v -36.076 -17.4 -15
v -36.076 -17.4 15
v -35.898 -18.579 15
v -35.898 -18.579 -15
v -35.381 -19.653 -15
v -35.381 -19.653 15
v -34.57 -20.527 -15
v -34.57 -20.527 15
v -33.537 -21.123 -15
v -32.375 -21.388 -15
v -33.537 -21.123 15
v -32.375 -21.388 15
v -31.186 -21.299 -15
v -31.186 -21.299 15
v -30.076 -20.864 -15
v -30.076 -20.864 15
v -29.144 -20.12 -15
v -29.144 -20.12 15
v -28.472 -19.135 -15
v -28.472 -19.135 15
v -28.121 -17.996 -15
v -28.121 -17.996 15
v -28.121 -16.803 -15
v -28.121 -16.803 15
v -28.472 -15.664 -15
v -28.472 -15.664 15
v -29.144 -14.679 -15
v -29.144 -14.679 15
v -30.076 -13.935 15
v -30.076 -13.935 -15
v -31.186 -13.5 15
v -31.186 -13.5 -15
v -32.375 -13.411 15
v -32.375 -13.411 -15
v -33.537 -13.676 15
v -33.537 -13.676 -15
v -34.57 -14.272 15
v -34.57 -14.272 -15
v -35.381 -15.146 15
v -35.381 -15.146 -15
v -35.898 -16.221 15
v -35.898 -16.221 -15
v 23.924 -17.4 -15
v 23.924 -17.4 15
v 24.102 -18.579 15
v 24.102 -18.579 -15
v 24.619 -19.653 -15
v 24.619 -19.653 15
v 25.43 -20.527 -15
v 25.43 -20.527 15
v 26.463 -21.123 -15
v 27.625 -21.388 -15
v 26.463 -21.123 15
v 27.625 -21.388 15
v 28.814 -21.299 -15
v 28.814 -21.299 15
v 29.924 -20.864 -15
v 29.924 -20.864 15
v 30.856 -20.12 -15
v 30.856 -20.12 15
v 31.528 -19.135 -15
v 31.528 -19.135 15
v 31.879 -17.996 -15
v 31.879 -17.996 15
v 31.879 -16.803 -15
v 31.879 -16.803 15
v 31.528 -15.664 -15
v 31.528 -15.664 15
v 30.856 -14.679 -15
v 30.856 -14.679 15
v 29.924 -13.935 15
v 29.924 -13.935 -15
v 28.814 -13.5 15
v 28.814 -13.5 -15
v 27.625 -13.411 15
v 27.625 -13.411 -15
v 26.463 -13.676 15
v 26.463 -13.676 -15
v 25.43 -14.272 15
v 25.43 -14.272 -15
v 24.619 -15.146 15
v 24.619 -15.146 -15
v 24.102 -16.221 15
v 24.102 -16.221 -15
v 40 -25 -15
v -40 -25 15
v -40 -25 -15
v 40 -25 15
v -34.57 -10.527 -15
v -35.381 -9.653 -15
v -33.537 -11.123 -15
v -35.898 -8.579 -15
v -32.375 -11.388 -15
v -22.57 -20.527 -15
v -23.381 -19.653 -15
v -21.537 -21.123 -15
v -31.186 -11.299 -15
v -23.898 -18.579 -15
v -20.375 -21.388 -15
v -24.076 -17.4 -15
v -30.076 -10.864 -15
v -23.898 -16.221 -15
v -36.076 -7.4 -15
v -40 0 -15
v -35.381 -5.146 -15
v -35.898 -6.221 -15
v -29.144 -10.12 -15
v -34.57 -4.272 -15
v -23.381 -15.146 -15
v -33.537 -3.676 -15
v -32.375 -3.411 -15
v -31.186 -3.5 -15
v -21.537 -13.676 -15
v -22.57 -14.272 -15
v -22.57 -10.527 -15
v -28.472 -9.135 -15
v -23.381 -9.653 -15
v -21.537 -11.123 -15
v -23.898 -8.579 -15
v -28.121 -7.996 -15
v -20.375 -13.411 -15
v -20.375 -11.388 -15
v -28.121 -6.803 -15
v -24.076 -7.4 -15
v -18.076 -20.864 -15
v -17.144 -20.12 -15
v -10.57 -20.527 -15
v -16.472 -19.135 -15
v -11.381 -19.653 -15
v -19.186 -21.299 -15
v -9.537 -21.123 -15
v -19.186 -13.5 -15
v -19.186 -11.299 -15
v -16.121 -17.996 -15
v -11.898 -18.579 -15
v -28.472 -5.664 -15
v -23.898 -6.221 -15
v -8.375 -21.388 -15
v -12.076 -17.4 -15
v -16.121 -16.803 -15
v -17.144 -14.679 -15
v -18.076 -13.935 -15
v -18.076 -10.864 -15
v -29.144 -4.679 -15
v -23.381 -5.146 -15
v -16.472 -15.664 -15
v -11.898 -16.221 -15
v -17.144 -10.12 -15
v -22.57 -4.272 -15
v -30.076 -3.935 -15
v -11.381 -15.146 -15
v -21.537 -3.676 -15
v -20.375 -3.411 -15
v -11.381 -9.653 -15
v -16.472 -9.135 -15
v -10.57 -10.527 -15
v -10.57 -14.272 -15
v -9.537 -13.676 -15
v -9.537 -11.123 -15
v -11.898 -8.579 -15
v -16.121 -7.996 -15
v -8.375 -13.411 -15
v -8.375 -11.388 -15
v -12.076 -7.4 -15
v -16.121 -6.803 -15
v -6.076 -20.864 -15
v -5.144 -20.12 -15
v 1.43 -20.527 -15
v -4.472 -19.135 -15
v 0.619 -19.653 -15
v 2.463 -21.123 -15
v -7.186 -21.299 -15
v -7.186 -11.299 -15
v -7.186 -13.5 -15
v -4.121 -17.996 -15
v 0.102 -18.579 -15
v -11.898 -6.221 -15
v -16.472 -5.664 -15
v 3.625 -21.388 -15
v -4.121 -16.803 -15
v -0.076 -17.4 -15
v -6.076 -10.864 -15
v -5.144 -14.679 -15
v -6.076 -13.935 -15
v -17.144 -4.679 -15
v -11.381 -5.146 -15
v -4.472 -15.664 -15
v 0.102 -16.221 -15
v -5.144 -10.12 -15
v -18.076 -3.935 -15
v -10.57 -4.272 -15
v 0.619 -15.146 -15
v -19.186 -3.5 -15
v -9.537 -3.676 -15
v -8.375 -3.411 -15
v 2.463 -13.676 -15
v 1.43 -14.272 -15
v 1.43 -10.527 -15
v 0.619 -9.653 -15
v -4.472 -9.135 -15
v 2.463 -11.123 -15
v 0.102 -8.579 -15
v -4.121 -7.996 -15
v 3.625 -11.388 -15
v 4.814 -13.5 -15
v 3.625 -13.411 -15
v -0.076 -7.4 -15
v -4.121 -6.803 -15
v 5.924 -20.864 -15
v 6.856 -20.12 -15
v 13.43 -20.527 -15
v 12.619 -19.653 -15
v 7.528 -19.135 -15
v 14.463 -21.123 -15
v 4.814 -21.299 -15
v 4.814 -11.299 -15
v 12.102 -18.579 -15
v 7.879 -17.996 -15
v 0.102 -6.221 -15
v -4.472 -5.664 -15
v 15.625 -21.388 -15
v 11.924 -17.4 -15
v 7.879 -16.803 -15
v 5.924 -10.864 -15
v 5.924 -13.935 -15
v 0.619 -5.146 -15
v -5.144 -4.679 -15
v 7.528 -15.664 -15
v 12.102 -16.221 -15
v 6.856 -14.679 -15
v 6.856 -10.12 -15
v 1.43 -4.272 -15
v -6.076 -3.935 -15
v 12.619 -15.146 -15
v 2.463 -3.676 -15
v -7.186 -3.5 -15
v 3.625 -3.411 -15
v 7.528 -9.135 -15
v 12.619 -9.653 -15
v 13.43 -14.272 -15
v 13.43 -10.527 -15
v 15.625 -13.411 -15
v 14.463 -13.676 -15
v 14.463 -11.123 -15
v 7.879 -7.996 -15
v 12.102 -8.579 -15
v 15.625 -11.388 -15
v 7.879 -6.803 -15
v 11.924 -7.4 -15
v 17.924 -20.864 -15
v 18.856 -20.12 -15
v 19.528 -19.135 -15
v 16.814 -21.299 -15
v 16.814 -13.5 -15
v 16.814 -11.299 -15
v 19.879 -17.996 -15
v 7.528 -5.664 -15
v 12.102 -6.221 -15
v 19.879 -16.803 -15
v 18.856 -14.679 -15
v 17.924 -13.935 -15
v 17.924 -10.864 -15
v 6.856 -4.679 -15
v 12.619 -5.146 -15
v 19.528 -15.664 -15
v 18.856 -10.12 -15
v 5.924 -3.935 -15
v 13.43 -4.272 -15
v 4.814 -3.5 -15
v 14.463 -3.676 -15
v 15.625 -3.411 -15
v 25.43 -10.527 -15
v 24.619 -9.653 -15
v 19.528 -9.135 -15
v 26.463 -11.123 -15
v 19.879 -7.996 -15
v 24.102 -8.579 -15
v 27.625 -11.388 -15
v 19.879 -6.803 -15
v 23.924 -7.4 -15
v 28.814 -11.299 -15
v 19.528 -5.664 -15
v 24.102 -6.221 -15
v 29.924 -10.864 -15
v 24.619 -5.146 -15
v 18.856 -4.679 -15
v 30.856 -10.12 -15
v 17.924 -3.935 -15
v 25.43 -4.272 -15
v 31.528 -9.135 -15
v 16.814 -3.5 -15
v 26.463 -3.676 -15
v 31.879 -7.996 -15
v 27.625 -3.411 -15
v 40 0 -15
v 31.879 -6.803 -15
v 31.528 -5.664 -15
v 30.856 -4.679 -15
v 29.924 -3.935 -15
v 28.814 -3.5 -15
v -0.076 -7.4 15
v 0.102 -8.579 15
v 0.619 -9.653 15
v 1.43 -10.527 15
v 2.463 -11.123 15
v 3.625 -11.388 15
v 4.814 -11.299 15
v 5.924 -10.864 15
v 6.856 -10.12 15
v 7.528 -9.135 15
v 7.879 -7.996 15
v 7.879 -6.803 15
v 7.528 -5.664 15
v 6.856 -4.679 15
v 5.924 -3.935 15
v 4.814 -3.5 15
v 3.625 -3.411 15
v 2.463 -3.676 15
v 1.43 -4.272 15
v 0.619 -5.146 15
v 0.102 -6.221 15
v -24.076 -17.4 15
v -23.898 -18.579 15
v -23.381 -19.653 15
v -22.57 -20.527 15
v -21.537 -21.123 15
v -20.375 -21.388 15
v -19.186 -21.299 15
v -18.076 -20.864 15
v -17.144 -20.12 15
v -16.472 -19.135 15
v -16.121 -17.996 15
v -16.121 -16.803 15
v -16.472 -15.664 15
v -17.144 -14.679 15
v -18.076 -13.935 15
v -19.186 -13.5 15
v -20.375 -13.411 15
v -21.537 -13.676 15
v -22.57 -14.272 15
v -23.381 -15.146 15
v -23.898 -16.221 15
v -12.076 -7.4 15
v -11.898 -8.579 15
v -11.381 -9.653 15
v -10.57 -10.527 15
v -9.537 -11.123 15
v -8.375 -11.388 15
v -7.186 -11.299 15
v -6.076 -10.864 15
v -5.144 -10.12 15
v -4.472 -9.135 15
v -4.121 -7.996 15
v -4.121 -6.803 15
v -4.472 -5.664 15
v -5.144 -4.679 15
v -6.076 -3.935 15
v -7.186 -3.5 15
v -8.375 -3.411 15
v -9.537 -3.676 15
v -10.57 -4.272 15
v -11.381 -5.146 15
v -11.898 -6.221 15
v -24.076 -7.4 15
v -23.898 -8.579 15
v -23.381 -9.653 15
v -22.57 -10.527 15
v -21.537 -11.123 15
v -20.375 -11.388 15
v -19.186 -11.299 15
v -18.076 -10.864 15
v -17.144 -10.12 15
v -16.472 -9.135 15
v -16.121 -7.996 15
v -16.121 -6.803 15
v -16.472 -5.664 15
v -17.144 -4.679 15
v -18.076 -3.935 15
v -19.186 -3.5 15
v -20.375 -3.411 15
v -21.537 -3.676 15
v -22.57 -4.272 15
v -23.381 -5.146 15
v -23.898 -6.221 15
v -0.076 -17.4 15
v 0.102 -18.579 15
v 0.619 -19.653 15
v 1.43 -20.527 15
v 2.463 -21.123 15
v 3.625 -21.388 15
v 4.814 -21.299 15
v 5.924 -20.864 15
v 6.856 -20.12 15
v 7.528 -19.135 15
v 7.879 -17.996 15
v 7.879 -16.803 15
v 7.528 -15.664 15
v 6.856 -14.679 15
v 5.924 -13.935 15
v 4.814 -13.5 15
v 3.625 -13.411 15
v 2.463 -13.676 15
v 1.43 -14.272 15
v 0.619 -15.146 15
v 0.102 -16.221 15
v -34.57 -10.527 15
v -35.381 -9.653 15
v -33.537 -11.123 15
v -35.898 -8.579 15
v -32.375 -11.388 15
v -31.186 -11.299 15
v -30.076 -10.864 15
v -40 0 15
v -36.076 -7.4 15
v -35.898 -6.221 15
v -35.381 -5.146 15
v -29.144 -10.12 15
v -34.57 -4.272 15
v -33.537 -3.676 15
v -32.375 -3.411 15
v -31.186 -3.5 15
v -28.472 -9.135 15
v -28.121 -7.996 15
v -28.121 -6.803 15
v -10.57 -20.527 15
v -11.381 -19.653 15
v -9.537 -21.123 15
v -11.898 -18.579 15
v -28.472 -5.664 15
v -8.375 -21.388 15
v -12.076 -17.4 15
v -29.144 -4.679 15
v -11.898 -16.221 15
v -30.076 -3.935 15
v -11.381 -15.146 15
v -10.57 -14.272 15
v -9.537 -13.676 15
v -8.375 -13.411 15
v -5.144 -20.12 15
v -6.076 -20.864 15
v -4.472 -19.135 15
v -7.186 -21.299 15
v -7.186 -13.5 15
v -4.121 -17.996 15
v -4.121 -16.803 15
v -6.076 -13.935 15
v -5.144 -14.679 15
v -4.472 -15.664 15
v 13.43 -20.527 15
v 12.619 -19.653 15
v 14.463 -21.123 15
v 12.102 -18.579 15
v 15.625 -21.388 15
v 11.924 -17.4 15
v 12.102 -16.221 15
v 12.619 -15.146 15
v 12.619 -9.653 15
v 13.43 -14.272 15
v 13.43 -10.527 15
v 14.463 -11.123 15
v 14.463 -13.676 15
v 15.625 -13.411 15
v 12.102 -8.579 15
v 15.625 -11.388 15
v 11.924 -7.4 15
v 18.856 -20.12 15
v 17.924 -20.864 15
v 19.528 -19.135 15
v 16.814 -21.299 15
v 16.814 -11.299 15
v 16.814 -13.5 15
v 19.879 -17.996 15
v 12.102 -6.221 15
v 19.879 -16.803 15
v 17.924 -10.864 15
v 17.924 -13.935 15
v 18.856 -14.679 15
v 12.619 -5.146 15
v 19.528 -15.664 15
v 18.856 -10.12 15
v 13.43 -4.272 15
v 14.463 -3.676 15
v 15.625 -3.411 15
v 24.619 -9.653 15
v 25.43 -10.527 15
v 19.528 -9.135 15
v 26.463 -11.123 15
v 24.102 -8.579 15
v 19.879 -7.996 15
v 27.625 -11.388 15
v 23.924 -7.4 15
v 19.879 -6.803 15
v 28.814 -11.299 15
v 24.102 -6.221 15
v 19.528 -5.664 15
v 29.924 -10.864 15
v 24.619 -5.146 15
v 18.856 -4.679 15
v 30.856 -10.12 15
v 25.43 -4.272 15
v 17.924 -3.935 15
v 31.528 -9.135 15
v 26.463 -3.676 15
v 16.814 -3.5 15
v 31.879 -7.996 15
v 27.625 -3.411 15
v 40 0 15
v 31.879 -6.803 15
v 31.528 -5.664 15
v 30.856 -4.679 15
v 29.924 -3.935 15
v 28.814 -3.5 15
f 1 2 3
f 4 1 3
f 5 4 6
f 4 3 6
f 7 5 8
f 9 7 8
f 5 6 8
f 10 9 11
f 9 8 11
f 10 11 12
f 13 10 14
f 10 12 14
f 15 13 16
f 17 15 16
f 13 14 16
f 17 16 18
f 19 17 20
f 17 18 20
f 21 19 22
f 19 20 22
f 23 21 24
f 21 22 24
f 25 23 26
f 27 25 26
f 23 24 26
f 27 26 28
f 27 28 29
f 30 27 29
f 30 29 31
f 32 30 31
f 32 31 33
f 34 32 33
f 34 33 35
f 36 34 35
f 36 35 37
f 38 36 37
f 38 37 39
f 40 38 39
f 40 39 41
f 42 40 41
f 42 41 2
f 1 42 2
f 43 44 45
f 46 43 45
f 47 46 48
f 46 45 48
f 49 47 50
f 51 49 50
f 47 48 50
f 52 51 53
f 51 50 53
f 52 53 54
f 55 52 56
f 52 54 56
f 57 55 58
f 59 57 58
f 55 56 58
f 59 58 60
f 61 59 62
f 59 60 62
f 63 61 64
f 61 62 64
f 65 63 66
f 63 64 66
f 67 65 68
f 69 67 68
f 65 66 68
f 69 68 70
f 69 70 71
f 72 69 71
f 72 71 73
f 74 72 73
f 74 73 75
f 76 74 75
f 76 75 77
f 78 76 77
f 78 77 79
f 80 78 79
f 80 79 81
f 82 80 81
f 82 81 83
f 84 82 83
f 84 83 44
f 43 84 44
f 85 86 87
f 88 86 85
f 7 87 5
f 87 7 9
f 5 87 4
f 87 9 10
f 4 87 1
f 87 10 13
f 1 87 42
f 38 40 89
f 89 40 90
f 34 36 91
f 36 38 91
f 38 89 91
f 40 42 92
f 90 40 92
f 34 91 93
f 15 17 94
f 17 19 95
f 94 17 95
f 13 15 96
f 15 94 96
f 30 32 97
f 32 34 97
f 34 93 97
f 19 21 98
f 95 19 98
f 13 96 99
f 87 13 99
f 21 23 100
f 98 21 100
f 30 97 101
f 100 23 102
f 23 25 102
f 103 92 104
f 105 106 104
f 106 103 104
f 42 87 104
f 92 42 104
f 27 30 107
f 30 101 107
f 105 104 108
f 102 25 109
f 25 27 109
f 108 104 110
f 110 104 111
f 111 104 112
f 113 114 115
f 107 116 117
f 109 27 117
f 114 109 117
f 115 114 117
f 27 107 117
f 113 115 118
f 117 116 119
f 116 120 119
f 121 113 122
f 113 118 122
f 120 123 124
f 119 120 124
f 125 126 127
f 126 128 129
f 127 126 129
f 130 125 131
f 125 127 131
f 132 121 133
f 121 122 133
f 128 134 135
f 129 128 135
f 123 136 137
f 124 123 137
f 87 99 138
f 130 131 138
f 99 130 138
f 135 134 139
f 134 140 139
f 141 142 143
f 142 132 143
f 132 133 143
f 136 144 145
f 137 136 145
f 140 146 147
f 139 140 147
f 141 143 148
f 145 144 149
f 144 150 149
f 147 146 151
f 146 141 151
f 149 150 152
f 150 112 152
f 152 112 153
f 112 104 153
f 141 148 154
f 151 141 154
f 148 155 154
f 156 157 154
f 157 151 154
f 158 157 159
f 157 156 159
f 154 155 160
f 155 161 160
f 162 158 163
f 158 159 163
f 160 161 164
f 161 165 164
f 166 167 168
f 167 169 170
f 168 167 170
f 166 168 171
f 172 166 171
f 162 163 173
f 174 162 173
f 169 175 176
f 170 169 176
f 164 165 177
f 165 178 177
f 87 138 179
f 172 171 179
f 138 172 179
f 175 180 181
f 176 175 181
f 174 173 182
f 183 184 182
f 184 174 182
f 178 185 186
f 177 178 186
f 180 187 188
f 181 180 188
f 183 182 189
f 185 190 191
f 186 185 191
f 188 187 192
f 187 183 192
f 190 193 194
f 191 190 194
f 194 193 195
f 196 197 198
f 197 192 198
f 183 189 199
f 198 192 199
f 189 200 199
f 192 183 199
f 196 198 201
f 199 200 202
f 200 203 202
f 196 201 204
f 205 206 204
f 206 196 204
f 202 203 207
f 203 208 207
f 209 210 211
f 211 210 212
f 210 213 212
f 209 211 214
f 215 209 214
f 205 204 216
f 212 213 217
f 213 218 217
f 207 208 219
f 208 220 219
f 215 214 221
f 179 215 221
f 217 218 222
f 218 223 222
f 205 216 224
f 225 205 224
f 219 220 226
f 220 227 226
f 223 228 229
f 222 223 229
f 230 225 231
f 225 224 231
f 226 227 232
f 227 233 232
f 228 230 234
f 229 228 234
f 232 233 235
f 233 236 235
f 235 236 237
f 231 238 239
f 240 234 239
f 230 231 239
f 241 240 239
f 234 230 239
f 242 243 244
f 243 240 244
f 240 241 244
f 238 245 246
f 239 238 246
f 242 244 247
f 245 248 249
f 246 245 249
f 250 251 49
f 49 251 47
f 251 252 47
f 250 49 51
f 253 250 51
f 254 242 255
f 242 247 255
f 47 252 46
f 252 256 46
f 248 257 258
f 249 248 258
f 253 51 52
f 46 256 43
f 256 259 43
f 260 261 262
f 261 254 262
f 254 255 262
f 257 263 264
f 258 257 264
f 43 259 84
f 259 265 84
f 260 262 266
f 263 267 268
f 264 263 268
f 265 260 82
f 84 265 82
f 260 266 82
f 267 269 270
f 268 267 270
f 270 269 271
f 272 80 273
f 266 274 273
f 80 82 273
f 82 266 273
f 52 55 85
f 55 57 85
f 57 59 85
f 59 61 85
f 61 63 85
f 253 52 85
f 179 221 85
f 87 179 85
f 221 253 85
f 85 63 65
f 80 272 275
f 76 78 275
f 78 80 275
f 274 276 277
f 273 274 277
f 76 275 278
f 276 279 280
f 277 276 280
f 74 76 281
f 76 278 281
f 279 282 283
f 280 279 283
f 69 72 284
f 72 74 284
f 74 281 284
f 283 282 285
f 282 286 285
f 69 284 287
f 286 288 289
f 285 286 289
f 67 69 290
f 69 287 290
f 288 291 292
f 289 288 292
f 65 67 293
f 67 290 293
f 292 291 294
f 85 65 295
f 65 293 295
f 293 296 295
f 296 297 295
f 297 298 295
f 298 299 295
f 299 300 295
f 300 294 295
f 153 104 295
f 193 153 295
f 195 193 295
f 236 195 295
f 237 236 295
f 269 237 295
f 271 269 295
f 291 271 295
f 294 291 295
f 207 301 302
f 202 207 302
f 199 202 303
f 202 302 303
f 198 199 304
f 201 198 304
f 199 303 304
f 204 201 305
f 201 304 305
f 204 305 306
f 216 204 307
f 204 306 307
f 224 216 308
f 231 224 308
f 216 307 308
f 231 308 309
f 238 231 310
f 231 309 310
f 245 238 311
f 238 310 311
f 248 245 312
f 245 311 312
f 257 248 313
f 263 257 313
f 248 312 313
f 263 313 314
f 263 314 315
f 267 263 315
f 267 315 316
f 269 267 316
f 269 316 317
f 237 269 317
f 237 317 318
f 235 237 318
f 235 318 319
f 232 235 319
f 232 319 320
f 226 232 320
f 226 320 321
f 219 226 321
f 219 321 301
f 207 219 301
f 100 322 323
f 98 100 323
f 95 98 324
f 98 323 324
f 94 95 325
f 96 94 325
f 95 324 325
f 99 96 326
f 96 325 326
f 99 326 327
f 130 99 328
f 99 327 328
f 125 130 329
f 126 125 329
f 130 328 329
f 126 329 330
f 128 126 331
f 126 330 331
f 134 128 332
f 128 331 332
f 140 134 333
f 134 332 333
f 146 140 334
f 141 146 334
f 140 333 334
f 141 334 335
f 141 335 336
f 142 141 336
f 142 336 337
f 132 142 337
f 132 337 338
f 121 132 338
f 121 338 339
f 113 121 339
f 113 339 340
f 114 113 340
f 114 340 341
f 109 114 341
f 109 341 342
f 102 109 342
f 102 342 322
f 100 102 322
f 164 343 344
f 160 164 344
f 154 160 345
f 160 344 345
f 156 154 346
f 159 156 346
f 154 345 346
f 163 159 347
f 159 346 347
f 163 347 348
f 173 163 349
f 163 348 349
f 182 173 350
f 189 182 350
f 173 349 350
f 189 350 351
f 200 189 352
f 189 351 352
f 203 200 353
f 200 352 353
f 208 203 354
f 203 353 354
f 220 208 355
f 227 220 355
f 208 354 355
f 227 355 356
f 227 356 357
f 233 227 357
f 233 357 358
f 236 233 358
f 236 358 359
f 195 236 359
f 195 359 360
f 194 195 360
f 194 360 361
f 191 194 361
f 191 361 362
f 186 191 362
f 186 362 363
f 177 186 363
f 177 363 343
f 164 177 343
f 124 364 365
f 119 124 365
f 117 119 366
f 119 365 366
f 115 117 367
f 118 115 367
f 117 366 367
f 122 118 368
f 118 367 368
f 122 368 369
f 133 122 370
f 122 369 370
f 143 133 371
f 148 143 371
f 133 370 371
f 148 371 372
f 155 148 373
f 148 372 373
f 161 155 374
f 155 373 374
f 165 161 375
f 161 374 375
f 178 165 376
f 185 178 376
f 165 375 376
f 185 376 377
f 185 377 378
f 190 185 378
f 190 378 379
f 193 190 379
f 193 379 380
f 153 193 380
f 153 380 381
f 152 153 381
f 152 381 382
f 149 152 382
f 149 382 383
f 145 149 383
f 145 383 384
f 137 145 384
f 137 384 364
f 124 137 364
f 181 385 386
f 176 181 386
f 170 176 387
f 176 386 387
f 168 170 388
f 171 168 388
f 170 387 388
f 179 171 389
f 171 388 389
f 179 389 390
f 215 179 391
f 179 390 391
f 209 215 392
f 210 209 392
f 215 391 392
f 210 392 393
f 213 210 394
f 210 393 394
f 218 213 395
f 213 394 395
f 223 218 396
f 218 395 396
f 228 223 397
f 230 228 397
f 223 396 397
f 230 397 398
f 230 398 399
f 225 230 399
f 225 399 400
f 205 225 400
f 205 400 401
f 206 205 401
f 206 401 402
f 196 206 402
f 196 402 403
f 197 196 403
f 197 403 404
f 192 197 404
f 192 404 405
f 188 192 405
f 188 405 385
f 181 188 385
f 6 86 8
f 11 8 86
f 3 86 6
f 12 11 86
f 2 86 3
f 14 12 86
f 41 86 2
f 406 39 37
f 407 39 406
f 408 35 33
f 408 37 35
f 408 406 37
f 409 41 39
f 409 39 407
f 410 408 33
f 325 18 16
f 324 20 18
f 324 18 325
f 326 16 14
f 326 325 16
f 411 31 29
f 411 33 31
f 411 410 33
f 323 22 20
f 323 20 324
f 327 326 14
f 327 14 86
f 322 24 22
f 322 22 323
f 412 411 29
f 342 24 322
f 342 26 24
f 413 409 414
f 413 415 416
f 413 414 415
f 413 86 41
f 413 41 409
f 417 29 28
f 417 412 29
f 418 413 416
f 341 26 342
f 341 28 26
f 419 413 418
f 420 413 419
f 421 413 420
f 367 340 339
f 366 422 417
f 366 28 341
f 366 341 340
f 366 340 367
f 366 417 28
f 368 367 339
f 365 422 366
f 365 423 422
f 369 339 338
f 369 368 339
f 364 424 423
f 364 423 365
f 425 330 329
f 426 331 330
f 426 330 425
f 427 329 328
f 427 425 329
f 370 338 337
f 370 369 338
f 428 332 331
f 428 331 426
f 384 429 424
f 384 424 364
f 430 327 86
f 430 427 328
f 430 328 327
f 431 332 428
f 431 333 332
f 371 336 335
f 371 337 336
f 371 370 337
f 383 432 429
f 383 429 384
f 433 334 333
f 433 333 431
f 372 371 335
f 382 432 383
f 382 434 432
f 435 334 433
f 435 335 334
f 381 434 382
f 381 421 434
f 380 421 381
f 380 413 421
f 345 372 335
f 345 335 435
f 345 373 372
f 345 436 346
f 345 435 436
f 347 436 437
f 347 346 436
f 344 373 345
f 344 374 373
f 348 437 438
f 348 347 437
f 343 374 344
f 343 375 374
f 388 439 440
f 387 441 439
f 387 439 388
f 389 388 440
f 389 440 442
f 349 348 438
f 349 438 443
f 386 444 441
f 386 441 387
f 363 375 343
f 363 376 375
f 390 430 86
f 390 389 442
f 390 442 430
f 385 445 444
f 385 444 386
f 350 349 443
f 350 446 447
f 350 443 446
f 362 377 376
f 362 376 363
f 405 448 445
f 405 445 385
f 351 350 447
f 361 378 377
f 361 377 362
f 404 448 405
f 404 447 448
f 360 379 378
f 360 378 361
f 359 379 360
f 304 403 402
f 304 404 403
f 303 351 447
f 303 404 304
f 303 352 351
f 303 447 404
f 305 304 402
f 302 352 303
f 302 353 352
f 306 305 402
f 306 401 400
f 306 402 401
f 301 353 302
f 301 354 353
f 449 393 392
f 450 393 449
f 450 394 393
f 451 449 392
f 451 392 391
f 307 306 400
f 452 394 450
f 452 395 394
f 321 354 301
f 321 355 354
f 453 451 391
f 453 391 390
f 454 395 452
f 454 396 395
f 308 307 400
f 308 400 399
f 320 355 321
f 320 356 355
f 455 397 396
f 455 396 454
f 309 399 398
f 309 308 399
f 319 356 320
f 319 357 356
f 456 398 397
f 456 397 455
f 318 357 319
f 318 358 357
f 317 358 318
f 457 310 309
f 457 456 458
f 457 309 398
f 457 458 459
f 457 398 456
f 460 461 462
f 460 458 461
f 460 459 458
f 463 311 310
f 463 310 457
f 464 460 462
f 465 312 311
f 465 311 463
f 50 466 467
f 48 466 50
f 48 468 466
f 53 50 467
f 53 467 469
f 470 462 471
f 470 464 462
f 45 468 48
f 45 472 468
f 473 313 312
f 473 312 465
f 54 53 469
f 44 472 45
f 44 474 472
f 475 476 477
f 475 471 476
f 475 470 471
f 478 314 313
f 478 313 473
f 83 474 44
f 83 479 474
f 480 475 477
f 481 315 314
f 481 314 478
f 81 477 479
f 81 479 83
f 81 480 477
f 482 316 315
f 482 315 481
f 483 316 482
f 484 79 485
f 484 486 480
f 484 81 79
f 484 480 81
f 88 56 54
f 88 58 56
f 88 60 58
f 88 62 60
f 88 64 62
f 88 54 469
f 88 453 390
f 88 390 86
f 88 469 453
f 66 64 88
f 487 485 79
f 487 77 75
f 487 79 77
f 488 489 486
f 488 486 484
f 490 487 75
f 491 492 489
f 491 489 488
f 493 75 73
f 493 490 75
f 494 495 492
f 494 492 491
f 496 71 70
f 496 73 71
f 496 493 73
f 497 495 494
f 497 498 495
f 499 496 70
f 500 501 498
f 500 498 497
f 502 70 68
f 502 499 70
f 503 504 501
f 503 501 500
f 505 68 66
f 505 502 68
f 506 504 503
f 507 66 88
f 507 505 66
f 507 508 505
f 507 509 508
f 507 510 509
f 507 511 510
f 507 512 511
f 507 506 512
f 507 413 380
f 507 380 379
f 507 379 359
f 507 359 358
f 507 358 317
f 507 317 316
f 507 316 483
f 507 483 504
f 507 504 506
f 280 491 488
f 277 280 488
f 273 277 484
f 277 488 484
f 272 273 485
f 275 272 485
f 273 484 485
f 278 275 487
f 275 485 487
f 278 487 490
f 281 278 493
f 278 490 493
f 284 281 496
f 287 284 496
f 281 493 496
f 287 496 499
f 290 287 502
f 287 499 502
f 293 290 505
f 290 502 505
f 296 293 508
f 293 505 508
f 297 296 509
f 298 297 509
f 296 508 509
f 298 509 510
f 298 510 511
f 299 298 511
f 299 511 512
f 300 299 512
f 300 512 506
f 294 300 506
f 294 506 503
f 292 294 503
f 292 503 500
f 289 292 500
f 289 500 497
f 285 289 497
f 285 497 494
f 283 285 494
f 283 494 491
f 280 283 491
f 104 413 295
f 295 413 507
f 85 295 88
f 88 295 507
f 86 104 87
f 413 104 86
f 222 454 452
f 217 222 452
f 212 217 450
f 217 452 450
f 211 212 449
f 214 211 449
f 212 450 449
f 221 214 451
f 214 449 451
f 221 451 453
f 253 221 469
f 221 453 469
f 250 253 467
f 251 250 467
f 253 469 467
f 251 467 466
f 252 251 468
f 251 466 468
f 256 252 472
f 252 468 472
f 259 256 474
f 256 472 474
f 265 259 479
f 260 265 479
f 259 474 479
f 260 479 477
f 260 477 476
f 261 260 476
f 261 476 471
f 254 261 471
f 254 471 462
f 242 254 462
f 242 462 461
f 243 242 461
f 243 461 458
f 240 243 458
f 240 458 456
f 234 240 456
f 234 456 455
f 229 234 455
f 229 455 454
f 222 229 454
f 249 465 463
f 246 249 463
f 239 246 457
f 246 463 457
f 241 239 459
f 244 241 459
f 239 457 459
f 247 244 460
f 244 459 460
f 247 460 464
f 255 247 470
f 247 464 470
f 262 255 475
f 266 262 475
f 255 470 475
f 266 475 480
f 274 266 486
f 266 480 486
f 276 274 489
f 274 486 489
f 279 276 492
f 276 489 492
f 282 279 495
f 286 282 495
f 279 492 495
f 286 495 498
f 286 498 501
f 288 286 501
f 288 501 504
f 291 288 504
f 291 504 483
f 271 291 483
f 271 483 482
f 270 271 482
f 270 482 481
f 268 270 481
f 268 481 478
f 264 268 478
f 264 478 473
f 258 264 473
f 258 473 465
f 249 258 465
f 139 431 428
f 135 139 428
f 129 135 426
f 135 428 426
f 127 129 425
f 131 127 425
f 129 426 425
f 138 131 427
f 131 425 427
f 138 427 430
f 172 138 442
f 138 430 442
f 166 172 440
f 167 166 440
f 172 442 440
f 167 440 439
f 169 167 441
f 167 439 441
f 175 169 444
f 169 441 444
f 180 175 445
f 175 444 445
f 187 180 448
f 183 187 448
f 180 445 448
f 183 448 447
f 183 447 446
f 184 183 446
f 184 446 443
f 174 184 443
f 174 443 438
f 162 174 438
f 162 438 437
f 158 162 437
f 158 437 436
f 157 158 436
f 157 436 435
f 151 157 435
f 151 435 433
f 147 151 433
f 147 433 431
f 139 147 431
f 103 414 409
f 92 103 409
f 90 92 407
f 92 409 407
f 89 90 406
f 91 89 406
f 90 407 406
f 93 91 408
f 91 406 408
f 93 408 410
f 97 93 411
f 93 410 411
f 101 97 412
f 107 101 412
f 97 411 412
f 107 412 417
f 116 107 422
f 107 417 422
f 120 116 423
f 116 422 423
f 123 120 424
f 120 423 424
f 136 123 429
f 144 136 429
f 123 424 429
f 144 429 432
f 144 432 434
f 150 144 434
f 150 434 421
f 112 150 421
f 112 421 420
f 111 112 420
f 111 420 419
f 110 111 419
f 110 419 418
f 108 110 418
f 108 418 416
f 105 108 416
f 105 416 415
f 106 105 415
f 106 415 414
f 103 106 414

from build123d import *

# Parameters (mm, degrees)
F0_W     = 80
F0_H     = 30
F1_DEPTH = 25
F3_D     = 8


with BuildPart() as f1:
    # F0 (on Front) → F1 (new body)
    with BuildSketch(Plane.XZ):
        Rectangle(F0_W, F0_H)
    extrude(amount=F1_DEPTH)

    # F3 (through all)
    with Locations(Plane(origin=(0, 0, -15), x_dir=(1, 0, 0), z_dir=(0, 0, -1))):
        with Locations((-32.076024, 17.399574), (-20.076024, 17.399574), (-8.076024, 17.399574), (3.923976, 17.399574), (15.923976, 17.399574), (27.923976, 17.399574), (27.923976, 7.399574), (15.923976, 7.399574), (3.923976, 7.399574), (-20.076024, 7.399574), (-32.076024, 7.399574), (-8.076024, 7.399574)):
            Hole(F3_D / 2)


solid = f1.part
